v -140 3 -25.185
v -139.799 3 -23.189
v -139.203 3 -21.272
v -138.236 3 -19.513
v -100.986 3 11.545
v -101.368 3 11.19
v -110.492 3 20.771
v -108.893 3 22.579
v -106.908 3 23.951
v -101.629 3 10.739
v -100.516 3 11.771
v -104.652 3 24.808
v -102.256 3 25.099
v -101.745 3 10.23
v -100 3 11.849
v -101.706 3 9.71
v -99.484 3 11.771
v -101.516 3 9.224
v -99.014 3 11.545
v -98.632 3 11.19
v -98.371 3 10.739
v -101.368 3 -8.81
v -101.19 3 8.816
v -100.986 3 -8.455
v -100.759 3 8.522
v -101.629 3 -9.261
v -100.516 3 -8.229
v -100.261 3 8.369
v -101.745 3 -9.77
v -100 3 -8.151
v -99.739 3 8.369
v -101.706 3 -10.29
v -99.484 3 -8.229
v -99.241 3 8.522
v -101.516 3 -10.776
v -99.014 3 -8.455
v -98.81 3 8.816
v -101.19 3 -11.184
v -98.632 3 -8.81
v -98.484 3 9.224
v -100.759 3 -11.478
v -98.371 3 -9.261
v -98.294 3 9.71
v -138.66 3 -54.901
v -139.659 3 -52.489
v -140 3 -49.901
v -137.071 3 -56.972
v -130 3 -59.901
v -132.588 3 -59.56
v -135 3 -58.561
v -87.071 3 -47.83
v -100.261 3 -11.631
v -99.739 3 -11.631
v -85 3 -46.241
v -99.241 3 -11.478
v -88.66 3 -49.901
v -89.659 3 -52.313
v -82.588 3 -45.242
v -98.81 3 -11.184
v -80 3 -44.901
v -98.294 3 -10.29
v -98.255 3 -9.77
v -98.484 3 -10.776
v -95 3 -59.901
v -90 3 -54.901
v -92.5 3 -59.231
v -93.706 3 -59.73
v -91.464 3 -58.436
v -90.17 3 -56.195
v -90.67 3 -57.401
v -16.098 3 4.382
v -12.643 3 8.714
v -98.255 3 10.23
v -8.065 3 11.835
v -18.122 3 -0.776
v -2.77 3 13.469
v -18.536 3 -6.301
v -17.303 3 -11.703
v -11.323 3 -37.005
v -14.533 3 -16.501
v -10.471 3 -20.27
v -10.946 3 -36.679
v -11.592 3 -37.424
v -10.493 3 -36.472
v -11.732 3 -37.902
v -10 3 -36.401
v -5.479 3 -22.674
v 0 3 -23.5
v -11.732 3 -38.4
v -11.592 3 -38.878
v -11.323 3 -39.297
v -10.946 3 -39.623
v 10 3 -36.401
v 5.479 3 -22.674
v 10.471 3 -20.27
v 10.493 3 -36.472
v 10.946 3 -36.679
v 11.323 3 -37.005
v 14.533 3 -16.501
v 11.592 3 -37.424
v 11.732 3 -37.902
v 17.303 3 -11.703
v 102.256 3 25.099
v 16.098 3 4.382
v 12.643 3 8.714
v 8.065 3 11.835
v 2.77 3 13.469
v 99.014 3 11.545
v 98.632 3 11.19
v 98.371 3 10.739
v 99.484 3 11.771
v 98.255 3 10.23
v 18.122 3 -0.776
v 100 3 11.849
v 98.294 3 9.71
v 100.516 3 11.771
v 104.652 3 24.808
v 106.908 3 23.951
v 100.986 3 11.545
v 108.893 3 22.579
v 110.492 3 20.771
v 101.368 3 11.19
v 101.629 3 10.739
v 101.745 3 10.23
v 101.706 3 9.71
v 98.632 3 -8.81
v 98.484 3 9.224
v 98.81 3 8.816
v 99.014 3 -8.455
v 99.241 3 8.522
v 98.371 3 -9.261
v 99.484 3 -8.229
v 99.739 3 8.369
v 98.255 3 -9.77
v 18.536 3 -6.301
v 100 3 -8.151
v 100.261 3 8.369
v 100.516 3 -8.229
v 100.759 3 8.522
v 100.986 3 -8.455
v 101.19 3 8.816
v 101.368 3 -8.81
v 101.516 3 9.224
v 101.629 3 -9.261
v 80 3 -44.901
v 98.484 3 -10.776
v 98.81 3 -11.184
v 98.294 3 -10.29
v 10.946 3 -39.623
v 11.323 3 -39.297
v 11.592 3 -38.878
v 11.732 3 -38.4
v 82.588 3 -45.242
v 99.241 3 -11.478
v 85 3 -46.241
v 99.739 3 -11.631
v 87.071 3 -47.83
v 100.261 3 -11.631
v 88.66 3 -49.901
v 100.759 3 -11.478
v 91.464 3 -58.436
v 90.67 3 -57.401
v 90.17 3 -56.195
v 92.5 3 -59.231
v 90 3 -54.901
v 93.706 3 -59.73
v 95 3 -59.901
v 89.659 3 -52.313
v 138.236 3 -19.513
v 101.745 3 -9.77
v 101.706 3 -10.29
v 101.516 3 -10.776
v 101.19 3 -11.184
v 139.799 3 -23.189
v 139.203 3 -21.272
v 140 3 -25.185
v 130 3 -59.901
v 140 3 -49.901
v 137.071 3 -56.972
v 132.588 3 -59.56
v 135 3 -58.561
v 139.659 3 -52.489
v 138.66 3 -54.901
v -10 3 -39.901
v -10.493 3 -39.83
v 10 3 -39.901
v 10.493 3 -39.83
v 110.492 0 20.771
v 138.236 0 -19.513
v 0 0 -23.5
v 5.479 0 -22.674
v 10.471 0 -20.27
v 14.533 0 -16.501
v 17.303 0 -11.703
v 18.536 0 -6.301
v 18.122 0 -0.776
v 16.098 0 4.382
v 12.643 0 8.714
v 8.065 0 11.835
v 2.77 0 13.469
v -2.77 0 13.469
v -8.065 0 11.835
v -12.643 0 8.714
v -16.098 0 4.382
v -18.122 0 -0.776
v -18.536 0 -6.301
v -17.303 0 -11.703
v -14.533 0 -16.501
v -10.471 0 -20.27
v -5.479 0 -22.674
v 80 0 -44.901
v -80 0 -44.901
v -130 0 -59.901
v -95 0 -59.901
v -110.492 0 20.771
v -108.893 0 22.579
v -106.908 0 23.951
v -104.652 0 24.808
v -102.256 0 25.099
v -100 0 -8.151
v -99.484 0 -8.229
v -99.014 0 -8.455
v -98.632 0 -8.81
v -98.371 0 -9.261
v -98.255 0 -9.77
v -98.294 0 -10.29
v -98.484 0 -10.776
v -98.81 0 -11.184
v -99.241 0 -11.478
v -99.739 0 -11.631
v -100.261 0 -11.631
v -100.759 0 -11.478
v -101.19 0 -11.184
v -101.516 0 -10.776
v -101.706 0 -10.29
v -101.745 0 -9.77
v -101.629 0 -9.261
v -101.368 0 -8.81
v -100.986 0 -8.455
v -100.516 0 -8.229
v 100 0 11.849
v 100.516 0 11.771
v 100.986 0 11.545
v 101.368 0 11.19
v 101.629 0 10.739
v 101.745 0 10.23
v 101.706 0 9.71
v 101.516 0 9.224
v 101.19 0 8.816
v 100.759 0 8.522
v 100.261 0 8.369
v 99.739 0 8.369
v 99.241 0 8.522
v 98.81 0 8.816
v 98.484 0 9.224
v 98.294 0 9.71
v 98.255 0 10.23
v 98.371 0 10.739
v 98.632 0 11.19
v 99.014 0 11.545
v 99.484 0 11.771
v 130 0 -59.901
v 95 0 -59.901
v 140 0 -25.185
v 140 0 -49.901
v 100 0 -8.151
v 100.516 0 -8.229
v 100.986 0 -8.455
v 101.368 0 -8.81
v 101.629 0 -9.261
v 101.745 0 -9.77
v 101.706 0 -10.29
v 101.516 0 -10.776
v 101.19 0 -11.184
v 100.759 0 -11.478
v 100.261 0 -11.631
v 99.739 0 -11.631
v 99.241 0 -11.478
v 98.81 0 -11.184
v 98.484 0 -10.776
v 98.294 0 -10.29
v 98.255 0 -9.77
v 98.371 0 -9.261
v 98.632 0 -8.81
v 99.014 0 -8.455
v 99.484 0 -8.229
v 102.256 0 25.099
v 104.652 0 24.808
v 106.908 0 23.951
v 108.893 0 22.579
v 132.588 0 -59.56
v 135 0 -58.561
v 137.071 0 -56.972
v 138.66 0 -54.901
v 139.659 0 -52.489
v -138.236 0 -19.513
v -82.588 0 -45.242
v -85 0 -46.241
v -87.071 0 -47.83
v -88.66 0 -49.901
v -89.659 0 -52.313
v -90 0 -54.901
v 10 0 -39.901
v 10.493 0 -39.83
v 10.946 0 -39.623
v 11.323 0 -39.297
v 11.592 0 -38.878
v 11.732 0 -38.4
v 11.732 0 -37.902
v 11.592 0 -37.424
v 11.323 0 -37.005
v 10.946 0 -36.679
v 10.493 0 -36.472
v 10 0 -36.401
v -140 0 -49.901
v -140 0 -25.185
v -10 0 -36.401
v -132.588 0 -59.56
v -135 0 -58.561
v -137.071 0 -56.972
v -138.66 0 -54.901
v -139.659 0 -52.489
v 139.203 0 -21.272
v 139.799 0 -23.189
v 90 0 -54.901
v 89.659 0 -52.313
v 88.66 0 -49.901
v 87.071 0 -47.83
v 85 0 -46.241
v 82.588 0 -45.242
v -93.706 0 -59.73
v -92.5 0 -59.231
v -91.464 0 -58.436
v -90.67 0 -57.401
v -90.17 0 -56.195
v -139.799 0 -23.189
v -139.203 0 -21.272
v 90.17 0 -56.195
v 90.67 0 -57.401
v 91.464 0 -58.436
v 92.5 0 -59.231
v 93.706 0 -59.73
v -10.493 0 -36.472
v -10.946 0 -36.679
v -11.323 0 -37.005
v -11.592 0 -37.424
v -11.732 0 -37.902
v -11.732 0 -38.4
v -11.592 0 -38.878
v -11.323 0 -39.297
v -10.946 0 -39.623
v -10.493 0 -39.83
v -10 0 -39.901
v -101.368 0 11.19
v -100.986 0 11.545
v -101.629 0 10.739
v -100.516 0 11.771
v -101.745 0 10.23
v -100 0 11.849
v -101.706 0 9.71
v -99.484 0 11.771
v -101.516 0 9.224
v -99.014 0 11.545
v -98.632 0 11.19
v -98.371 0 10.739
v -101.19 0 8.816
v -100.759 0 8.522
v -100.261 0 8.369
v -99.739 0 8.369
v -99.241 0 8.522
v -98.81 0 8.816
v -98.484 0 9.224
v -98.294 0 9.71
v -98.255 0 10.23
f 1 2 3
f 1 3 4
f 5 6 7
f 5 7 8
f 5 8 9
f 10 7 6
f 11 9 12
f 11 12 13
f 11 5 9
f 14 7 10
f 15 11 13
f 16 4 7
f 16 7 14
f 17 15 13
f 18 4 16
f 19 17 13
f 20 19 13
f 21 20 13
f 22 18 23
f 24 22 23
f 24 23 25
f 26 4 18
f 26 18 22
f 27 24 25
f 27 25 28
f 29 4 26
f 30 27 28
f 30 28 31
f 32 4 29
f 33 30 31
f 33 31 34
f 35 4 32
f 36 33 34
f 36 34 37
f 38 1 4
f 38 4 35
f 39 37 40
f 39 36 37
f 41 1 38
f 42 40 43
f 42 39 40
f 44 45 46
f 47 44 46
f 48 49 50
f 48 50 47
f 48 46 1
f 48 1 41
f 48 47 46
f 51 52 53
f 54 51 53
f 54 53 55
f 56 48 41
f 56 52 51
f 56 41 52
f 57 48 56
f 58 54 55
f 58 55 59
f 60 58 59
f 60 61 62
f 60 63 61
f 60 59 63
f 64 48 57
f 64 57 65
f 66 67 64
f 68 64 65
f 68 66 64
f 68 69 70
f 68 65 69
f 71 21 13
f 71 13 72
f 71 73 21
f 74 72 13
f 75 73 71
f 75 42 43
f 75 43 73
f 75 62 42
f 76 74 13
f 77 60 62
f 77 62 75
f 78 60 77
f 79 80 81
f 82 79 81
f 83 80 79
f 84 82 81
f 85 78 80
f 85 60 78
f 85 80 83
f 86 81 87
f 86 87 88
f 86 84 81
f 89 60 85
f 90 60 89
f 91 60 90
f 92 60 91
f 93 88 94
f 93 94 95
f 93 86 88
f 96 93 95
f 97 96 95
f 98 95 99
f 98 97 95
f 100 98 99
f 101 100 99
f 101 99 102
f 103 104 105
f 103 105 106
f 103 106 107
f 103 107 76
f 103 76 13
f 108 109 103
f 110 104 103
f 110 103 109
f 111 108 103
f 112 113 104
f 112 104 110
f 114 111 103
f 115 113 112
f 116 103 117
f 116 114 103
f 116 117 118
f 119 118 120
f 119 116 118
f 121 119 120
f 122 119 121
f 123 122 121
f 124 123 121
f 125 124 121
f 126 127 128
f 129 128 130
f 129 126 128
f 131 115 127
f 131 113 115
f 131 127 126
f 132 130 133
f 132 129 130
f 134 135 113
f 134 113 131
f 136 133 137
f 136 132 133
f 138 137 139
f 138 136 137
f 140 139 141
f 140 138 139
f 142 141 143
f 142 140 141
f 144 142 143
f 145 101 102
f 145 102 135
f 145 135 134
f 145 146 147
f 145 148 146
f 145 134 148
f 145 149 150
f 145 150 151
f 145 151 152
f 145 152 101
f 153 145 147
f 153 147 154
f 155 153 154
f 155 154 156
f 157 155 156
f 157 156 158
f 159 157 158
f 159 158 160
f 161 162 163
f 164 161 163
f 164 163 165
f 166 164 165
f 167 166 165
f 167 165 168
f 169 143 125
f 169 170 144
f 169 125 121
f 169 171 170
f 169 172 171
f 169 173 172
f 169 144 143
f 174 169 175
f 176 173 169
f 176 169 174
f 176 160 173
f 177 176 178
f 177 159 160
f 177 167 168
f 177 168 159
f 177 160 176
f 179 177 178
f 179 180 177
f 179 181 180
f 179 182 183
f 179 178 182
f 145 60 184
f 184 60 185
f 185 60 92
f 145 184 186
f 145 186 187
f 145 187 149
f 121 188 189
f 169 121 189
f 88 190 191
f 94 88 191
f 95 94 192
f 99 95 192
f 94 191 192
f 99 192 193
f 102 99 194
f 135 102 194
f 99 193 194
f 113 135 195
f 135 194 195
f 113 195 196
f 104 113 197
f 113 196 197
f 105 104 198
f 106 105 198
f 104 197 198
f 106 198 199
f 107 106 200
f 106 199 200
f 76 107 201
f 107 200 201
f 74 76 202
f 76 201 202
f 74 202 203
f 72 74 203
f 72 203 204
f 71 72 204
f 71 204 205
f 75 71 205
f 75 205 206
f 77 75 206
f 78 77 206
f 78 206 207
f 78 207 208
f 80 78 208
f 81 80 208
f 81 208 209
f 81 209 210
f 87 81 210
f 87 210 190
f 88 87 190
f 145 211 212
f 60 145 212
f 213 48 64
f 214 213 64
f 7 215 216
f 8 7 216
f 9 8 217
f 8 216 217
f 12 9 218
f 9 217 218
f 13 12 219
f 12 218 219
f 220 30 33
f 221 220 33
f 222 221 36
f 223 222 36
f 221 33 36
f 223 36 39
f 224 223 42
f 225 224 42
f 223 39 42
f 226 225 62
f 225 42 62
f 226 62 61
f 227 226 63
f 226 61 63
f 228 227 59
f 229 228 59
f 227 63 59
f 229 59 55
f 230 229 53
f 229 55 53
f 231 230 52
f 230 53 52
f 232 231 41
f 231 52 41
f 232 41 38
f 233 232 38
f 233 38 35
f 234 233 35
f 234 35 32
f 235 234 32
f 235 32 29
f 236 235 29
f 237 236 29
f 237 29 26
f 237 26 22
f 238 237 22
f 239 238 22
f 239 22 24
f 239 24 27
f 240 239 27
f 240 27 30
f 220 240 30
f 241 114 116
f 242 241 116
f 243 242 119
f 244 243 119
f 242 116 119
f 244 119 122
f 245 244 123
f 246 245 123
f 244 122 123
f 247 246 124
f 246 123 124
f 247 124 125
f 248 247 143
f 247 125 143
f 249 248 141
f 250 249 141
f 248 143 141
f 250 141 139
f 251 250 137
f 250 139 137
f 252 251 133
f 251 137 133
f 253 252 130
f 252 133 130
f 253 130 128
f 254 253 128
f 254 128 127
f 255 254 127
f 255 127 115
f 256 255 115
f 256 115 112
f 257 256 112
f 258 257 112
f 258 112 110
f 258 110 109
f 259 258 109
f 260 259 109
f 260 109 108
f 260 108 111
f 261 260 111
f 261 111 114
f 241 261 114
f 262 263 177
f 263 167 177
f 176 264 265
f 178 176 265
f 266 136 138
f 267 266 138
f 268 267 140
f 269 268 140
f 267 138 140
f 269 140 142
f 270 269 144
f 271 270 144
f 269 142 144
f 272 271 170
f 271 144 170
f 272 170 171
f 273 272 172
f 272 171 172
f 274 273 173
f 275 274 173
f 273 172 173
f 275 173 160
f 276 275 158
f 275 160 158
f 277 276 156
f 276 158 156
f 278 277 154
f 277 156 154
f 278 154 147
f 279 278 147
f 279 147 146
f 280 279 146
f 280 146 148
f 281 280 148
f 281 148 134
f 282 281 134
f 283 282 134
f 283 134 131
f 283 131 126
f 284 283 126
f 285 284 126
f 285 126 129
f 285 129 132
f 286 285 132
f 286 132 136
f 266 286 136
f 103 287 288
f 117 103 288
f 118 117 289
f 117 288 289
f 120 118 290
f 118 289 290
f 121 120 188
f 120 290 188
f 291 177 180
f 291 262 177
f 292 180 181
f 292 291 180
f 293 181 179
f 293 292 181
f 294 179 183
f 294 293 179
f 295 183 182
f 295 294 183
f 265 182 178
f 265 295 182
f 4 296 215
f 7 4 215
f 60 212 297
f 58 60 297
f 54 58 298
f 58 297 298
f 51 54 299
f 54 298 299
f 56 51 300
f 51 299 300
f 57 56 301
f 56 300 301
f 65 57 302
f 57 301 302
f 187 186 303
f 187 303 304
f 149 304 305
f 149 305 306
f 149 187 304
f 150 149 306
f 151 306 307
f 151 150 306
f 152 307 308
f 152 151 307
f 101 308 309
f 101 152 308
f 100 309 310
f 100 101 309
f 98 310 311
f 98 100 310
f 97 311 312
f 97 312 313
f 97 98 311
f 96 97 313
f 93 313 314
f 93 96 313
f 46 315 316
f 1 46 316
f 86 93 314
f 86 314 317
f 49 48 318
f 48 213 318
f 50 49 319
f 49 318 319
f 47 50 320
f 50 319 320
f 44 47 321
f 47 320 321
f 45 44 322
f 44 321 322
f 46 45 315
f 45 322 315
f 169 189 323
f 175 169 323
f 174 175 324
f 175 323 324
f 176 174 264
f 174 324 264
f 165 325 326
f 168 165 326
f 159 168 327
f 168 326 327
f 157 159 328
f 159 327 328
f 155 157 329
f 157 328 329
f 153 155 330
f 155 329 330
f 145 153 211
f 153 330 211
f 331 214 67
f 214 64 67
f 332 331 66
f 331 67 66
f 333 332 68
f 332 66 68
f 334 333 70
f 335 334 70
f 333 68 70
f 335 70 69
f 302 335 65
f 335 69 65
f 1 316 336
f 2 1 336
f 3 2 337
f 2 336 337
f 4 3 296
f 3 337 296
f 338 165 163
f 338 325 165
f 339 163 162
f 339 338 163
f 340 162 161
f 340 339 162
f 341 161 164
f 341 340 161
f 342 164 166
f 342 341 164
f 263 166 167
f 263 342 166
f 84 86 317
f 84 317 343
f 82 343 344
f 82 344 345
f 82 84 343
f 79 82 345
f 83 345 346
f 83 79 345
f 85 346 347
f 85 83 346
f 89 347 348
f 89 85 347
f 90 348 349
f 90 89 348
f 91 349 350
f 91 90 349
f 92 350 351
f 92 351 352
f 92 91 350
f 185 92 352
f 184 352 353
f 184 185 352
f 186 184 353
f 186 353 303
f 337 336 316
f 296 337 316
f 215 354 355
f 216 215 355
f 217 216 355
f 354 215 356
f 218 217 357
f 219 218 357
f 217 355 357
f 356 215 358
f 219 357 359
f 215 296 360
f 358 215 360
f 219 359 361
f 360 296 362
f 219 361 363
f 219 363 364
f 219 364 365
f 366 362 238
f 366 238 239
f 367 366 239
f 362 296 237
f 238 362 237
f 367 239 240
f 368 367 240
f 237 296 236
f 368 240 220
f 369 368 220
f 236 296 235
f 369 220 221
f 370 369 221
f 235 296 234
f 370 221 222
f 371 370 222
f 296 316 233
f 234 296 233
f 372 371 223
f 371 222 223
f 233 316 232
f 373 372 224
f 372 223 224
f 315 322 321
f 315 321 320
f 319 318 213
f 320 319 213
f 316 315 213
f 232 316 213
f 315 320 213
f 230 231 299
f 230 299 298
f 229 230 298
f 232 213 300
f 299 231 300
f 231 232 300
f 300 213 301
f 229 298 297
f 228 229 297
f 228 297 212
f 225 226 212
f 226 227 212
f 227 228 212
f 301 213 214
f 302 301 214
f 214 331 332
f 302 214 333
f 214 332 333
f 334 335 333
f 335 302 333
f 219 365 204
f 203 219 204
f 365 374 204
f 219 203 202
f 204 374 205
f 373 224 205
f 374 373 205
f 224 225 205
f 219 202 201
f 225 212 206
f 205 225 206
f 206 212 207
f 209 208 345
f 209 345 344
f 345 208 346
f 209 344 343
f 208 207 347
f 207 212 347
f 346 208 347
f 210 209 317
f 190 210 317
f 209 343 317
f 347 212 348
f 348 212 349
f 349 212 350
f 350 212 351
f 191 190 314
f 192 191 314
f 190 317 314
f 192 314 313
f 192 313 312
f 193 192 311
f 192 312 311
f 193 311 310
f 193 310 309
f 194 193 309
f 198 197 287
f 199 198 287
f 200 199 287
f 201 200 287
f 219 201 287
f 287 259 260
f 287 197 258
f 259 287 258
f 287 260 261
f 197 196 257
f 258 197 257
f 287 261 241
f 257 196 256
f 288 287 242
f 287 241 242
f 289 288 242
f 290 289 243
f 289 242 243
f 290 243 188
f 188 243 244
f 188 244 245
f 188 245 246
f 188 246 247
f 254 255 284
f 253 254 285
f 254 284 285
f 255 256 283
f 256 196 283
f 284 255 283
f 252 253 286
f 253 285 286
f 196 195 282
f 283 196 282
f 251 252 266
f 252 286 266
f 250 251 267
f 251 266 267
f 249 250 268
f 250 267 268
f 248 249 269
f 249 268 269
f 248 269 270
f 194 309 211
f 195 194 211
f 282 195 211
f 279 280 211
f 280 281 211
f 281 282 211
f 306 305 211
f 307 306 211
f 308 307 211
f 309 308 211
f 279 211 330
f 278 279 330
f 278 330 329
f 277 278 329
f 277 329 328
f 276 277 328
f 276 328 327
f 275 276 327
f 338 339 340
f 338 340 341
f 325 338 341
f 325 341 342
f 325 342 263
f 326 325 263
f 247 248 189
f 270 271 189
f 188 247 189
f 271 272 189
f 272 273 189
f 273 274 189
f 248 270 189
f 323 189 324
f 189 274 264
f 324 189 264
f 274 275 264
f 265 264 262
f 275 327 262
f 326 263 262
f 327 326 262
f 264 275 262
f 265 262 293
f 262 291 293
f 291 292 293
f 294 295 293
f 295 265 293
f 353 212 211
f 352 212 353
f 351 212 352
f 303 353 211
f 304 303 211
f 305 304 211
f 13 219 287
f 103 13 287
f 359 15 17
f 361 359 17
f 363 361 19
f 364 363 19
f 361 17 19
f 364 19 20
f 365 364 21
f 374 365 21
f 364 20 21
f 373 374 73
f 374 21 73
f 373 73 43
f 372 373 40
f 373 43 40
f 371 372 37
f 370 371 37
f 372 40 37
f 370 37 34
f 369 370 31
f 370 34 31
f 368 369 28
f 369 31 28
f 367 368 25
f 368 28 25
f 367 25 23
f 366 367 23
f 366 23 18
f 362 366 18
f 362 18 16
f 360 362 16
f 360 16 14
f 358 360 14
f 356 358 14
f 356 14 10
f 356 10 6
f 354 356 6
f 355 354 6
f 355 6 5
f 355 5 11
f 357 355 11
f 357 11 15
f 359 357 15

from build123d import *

# Parameters (mm, degrees)
EXTRUDE_1_DEPTH     = 3
SKETCH_4_W          = 287.107775492
SKETCH_4_H          = 19.420897723
CUT_EXTRUDE_2_DEPTH = 18
FILLET_3_R          = 5
FILLET_4_R          = 10
SKETCH_5_R          = 1.75
CUT_EXTRUDE_3_DEPTH = 18
CUT_EXTRUDE_6_DEPTH = 3
SKETCH_9_R          = 18.588109785
CUT_EXTRUDE_7_DEPTH = 10


with BuildPart() as part:
    # 草图1 → 凸台-拉伸1 (new body)
    with BuildSketch(Plane(origin=(0, 0, 0), x_dir=(1, 0, 0), z_dir=(0, 1, 0))):
        with BuildLine():
            Line((-138.235829522, 19.513411872), (-110.492131082, -20.771152042))
            ThreePointArc((-110.492131082, -20.771152042), (-106.908205257, -23.951300285), (-102.25630156, -25.099193643))
            Line((-102.25630156, -25.099193643), (102.25630156, -25.099193643))
            ThreePointArc((102.25630156, -25.099193643), (106.908205257, -23.951300285), (110.492131082, -20.771152042))
            Line((110.492131082, -20.771152042), (138.235829522, 19.513411872))
            ThreePointArc((138.235829522, 19.513411872), (139.548777283, 22.215378286), (140, 25.185370271))
            Line((140, 25.185370271), (140, 65))
            ThreePointArc((140, 65), (137.100120957, 72.000927314), (130.099193643, 74.900806357))
            Line((130.099193643, 74.900806357), (100, 74.900806357))
            ThreePointArc((100, 74.900806357), (92.928932188, 71.971874169), (90, 64.900806357))
            Line((90, 64.900806357), (90, 54.900806357))
            ThreePointArc((90, 54.900806357), (87.071067812, 47.829738545), (80, 44.900806357))
            Line((80, 44.900806357), (-80, 44.900806357))
            ThreePointArc((-80, 44.900806357), (-87.071067812, 47.829738545), (-90, 54.900806357))
            Line((-90, 54.900806357), (-90, 64.900806357))
            ThreePointArc((-90, 64.900806357), (-92.928932188, 71.971874169), (-100, 74.900806357))
            Line((-100, 74.900806357), (-130.099193643, 74.900806357))
            ThreePointArc((-130.099193643, 74.900806357), (-137.100120957, 72.000927314), (-140, 65))
            Line((-140, 65), (-140, 25.185370271))
            ThreePointArc((-140, 25.185370271), (-139.548777283, 22.215378286), (-138.235829522, 19.513411872))
        make_face()
    extrude(amount=EXTRUDE_1_DEPTH)

    # 草图4 → 切除-拉伸2 (cut)
    with BuildSketch(Plane(origin=(0, 3, 0), x_dir=(1, 0, 0), z_dir=(0, 1, 0))):
        with Locations((-3.553887746, 69.611255219)):
            Rectangle(SKETCH_4_W, SKETCH_4_H)
    extrude(amount=-CUT_EXTRUDE_2_DEPTH, mode=Mode.SUBTRACT)

    # 圆角3
    fillet_3_edges = [part.edges().sort_by_distance(p)[0] for p in [
        (-90, 1.5, -59.900806357),
        (90, 1.5, -59.900806357),
    ]]
    fillet(fillet_3_edges, radius=FILLET_3_R - 0.0001)  # a hair under: the kernel refuses the full size

    # 圆角4
    fillet_4_edges = [part.edges().sort_by_distance(p)[0] for p in [
        (140, 1.5, -59.900806357),
        (-140, 1.5, -59.900806357),
    ]]
    fillet(fillet_4_edges, radius=FILLET_4_R)

    # 草图5 → 切除-拉伸3 (cut)
    with BuildSketch(Plane(origin=(0, 3, 0), x_dir=(1, 0, 0), z_dir=(0, 1, 0))):
        with Locations(Location((100, -10.099193643, 0), (0, 0, 270))):
            Circle(SKETCH_5_R)
        with Locations(Location((100, 9.900806357, 0), (0, 0, 270))):
            Circle(SKETCH_5_R)
        with Locations(Location((-100, -10.099193643, 0), (0, 0, 270))):
            Circle(SKETCH_5_R)
        with Locations(Location((-100, 9.900806357, 0), (0, 0, 270))):
            Circle(SKETCH_5_R)
    extrude(amount=-CUT_EXTRUDE_3_DEPTH, mode=Mode.SUBTRACT)

    # 草图8 → 切除-拉伸6 (cut)
    with BuildSketch(Plane(origin=(0, 3, 0), x_dir=(1, 0, 0), z_dir=(0, 1, 0))):
        with BuildLine():
            Line((-10, 39.900806357), (10, 39.900806357))
            ThreePointArc((10, 39.900806357), (11.75, 38.150806357), (10, 36.400806357))
            Line((10, 36.400806357), (-10, 36.400806357))
            ThreePointArc((-10, 36.400806357), (-11.75, 38.150806357), (-10, 39.900806357))
        make_face()
    extrude(amount=-CUT_EXTRUDE_6_DEPTH, mode=Mode.SUBTRACT)

    # 草图9 → 切除-拉伸7 (cut)
    with BuildSketch(Plane.XZ):
        with Locations(Location((0, -4.911890215, 0), (0, 0, 270))):
            Circle(SKETCH_9_R)
    extrude(amount=-CUT_EXTRUDE_7_DEPTH, mode=Mode.SUBTRACT)


solid = part.part
